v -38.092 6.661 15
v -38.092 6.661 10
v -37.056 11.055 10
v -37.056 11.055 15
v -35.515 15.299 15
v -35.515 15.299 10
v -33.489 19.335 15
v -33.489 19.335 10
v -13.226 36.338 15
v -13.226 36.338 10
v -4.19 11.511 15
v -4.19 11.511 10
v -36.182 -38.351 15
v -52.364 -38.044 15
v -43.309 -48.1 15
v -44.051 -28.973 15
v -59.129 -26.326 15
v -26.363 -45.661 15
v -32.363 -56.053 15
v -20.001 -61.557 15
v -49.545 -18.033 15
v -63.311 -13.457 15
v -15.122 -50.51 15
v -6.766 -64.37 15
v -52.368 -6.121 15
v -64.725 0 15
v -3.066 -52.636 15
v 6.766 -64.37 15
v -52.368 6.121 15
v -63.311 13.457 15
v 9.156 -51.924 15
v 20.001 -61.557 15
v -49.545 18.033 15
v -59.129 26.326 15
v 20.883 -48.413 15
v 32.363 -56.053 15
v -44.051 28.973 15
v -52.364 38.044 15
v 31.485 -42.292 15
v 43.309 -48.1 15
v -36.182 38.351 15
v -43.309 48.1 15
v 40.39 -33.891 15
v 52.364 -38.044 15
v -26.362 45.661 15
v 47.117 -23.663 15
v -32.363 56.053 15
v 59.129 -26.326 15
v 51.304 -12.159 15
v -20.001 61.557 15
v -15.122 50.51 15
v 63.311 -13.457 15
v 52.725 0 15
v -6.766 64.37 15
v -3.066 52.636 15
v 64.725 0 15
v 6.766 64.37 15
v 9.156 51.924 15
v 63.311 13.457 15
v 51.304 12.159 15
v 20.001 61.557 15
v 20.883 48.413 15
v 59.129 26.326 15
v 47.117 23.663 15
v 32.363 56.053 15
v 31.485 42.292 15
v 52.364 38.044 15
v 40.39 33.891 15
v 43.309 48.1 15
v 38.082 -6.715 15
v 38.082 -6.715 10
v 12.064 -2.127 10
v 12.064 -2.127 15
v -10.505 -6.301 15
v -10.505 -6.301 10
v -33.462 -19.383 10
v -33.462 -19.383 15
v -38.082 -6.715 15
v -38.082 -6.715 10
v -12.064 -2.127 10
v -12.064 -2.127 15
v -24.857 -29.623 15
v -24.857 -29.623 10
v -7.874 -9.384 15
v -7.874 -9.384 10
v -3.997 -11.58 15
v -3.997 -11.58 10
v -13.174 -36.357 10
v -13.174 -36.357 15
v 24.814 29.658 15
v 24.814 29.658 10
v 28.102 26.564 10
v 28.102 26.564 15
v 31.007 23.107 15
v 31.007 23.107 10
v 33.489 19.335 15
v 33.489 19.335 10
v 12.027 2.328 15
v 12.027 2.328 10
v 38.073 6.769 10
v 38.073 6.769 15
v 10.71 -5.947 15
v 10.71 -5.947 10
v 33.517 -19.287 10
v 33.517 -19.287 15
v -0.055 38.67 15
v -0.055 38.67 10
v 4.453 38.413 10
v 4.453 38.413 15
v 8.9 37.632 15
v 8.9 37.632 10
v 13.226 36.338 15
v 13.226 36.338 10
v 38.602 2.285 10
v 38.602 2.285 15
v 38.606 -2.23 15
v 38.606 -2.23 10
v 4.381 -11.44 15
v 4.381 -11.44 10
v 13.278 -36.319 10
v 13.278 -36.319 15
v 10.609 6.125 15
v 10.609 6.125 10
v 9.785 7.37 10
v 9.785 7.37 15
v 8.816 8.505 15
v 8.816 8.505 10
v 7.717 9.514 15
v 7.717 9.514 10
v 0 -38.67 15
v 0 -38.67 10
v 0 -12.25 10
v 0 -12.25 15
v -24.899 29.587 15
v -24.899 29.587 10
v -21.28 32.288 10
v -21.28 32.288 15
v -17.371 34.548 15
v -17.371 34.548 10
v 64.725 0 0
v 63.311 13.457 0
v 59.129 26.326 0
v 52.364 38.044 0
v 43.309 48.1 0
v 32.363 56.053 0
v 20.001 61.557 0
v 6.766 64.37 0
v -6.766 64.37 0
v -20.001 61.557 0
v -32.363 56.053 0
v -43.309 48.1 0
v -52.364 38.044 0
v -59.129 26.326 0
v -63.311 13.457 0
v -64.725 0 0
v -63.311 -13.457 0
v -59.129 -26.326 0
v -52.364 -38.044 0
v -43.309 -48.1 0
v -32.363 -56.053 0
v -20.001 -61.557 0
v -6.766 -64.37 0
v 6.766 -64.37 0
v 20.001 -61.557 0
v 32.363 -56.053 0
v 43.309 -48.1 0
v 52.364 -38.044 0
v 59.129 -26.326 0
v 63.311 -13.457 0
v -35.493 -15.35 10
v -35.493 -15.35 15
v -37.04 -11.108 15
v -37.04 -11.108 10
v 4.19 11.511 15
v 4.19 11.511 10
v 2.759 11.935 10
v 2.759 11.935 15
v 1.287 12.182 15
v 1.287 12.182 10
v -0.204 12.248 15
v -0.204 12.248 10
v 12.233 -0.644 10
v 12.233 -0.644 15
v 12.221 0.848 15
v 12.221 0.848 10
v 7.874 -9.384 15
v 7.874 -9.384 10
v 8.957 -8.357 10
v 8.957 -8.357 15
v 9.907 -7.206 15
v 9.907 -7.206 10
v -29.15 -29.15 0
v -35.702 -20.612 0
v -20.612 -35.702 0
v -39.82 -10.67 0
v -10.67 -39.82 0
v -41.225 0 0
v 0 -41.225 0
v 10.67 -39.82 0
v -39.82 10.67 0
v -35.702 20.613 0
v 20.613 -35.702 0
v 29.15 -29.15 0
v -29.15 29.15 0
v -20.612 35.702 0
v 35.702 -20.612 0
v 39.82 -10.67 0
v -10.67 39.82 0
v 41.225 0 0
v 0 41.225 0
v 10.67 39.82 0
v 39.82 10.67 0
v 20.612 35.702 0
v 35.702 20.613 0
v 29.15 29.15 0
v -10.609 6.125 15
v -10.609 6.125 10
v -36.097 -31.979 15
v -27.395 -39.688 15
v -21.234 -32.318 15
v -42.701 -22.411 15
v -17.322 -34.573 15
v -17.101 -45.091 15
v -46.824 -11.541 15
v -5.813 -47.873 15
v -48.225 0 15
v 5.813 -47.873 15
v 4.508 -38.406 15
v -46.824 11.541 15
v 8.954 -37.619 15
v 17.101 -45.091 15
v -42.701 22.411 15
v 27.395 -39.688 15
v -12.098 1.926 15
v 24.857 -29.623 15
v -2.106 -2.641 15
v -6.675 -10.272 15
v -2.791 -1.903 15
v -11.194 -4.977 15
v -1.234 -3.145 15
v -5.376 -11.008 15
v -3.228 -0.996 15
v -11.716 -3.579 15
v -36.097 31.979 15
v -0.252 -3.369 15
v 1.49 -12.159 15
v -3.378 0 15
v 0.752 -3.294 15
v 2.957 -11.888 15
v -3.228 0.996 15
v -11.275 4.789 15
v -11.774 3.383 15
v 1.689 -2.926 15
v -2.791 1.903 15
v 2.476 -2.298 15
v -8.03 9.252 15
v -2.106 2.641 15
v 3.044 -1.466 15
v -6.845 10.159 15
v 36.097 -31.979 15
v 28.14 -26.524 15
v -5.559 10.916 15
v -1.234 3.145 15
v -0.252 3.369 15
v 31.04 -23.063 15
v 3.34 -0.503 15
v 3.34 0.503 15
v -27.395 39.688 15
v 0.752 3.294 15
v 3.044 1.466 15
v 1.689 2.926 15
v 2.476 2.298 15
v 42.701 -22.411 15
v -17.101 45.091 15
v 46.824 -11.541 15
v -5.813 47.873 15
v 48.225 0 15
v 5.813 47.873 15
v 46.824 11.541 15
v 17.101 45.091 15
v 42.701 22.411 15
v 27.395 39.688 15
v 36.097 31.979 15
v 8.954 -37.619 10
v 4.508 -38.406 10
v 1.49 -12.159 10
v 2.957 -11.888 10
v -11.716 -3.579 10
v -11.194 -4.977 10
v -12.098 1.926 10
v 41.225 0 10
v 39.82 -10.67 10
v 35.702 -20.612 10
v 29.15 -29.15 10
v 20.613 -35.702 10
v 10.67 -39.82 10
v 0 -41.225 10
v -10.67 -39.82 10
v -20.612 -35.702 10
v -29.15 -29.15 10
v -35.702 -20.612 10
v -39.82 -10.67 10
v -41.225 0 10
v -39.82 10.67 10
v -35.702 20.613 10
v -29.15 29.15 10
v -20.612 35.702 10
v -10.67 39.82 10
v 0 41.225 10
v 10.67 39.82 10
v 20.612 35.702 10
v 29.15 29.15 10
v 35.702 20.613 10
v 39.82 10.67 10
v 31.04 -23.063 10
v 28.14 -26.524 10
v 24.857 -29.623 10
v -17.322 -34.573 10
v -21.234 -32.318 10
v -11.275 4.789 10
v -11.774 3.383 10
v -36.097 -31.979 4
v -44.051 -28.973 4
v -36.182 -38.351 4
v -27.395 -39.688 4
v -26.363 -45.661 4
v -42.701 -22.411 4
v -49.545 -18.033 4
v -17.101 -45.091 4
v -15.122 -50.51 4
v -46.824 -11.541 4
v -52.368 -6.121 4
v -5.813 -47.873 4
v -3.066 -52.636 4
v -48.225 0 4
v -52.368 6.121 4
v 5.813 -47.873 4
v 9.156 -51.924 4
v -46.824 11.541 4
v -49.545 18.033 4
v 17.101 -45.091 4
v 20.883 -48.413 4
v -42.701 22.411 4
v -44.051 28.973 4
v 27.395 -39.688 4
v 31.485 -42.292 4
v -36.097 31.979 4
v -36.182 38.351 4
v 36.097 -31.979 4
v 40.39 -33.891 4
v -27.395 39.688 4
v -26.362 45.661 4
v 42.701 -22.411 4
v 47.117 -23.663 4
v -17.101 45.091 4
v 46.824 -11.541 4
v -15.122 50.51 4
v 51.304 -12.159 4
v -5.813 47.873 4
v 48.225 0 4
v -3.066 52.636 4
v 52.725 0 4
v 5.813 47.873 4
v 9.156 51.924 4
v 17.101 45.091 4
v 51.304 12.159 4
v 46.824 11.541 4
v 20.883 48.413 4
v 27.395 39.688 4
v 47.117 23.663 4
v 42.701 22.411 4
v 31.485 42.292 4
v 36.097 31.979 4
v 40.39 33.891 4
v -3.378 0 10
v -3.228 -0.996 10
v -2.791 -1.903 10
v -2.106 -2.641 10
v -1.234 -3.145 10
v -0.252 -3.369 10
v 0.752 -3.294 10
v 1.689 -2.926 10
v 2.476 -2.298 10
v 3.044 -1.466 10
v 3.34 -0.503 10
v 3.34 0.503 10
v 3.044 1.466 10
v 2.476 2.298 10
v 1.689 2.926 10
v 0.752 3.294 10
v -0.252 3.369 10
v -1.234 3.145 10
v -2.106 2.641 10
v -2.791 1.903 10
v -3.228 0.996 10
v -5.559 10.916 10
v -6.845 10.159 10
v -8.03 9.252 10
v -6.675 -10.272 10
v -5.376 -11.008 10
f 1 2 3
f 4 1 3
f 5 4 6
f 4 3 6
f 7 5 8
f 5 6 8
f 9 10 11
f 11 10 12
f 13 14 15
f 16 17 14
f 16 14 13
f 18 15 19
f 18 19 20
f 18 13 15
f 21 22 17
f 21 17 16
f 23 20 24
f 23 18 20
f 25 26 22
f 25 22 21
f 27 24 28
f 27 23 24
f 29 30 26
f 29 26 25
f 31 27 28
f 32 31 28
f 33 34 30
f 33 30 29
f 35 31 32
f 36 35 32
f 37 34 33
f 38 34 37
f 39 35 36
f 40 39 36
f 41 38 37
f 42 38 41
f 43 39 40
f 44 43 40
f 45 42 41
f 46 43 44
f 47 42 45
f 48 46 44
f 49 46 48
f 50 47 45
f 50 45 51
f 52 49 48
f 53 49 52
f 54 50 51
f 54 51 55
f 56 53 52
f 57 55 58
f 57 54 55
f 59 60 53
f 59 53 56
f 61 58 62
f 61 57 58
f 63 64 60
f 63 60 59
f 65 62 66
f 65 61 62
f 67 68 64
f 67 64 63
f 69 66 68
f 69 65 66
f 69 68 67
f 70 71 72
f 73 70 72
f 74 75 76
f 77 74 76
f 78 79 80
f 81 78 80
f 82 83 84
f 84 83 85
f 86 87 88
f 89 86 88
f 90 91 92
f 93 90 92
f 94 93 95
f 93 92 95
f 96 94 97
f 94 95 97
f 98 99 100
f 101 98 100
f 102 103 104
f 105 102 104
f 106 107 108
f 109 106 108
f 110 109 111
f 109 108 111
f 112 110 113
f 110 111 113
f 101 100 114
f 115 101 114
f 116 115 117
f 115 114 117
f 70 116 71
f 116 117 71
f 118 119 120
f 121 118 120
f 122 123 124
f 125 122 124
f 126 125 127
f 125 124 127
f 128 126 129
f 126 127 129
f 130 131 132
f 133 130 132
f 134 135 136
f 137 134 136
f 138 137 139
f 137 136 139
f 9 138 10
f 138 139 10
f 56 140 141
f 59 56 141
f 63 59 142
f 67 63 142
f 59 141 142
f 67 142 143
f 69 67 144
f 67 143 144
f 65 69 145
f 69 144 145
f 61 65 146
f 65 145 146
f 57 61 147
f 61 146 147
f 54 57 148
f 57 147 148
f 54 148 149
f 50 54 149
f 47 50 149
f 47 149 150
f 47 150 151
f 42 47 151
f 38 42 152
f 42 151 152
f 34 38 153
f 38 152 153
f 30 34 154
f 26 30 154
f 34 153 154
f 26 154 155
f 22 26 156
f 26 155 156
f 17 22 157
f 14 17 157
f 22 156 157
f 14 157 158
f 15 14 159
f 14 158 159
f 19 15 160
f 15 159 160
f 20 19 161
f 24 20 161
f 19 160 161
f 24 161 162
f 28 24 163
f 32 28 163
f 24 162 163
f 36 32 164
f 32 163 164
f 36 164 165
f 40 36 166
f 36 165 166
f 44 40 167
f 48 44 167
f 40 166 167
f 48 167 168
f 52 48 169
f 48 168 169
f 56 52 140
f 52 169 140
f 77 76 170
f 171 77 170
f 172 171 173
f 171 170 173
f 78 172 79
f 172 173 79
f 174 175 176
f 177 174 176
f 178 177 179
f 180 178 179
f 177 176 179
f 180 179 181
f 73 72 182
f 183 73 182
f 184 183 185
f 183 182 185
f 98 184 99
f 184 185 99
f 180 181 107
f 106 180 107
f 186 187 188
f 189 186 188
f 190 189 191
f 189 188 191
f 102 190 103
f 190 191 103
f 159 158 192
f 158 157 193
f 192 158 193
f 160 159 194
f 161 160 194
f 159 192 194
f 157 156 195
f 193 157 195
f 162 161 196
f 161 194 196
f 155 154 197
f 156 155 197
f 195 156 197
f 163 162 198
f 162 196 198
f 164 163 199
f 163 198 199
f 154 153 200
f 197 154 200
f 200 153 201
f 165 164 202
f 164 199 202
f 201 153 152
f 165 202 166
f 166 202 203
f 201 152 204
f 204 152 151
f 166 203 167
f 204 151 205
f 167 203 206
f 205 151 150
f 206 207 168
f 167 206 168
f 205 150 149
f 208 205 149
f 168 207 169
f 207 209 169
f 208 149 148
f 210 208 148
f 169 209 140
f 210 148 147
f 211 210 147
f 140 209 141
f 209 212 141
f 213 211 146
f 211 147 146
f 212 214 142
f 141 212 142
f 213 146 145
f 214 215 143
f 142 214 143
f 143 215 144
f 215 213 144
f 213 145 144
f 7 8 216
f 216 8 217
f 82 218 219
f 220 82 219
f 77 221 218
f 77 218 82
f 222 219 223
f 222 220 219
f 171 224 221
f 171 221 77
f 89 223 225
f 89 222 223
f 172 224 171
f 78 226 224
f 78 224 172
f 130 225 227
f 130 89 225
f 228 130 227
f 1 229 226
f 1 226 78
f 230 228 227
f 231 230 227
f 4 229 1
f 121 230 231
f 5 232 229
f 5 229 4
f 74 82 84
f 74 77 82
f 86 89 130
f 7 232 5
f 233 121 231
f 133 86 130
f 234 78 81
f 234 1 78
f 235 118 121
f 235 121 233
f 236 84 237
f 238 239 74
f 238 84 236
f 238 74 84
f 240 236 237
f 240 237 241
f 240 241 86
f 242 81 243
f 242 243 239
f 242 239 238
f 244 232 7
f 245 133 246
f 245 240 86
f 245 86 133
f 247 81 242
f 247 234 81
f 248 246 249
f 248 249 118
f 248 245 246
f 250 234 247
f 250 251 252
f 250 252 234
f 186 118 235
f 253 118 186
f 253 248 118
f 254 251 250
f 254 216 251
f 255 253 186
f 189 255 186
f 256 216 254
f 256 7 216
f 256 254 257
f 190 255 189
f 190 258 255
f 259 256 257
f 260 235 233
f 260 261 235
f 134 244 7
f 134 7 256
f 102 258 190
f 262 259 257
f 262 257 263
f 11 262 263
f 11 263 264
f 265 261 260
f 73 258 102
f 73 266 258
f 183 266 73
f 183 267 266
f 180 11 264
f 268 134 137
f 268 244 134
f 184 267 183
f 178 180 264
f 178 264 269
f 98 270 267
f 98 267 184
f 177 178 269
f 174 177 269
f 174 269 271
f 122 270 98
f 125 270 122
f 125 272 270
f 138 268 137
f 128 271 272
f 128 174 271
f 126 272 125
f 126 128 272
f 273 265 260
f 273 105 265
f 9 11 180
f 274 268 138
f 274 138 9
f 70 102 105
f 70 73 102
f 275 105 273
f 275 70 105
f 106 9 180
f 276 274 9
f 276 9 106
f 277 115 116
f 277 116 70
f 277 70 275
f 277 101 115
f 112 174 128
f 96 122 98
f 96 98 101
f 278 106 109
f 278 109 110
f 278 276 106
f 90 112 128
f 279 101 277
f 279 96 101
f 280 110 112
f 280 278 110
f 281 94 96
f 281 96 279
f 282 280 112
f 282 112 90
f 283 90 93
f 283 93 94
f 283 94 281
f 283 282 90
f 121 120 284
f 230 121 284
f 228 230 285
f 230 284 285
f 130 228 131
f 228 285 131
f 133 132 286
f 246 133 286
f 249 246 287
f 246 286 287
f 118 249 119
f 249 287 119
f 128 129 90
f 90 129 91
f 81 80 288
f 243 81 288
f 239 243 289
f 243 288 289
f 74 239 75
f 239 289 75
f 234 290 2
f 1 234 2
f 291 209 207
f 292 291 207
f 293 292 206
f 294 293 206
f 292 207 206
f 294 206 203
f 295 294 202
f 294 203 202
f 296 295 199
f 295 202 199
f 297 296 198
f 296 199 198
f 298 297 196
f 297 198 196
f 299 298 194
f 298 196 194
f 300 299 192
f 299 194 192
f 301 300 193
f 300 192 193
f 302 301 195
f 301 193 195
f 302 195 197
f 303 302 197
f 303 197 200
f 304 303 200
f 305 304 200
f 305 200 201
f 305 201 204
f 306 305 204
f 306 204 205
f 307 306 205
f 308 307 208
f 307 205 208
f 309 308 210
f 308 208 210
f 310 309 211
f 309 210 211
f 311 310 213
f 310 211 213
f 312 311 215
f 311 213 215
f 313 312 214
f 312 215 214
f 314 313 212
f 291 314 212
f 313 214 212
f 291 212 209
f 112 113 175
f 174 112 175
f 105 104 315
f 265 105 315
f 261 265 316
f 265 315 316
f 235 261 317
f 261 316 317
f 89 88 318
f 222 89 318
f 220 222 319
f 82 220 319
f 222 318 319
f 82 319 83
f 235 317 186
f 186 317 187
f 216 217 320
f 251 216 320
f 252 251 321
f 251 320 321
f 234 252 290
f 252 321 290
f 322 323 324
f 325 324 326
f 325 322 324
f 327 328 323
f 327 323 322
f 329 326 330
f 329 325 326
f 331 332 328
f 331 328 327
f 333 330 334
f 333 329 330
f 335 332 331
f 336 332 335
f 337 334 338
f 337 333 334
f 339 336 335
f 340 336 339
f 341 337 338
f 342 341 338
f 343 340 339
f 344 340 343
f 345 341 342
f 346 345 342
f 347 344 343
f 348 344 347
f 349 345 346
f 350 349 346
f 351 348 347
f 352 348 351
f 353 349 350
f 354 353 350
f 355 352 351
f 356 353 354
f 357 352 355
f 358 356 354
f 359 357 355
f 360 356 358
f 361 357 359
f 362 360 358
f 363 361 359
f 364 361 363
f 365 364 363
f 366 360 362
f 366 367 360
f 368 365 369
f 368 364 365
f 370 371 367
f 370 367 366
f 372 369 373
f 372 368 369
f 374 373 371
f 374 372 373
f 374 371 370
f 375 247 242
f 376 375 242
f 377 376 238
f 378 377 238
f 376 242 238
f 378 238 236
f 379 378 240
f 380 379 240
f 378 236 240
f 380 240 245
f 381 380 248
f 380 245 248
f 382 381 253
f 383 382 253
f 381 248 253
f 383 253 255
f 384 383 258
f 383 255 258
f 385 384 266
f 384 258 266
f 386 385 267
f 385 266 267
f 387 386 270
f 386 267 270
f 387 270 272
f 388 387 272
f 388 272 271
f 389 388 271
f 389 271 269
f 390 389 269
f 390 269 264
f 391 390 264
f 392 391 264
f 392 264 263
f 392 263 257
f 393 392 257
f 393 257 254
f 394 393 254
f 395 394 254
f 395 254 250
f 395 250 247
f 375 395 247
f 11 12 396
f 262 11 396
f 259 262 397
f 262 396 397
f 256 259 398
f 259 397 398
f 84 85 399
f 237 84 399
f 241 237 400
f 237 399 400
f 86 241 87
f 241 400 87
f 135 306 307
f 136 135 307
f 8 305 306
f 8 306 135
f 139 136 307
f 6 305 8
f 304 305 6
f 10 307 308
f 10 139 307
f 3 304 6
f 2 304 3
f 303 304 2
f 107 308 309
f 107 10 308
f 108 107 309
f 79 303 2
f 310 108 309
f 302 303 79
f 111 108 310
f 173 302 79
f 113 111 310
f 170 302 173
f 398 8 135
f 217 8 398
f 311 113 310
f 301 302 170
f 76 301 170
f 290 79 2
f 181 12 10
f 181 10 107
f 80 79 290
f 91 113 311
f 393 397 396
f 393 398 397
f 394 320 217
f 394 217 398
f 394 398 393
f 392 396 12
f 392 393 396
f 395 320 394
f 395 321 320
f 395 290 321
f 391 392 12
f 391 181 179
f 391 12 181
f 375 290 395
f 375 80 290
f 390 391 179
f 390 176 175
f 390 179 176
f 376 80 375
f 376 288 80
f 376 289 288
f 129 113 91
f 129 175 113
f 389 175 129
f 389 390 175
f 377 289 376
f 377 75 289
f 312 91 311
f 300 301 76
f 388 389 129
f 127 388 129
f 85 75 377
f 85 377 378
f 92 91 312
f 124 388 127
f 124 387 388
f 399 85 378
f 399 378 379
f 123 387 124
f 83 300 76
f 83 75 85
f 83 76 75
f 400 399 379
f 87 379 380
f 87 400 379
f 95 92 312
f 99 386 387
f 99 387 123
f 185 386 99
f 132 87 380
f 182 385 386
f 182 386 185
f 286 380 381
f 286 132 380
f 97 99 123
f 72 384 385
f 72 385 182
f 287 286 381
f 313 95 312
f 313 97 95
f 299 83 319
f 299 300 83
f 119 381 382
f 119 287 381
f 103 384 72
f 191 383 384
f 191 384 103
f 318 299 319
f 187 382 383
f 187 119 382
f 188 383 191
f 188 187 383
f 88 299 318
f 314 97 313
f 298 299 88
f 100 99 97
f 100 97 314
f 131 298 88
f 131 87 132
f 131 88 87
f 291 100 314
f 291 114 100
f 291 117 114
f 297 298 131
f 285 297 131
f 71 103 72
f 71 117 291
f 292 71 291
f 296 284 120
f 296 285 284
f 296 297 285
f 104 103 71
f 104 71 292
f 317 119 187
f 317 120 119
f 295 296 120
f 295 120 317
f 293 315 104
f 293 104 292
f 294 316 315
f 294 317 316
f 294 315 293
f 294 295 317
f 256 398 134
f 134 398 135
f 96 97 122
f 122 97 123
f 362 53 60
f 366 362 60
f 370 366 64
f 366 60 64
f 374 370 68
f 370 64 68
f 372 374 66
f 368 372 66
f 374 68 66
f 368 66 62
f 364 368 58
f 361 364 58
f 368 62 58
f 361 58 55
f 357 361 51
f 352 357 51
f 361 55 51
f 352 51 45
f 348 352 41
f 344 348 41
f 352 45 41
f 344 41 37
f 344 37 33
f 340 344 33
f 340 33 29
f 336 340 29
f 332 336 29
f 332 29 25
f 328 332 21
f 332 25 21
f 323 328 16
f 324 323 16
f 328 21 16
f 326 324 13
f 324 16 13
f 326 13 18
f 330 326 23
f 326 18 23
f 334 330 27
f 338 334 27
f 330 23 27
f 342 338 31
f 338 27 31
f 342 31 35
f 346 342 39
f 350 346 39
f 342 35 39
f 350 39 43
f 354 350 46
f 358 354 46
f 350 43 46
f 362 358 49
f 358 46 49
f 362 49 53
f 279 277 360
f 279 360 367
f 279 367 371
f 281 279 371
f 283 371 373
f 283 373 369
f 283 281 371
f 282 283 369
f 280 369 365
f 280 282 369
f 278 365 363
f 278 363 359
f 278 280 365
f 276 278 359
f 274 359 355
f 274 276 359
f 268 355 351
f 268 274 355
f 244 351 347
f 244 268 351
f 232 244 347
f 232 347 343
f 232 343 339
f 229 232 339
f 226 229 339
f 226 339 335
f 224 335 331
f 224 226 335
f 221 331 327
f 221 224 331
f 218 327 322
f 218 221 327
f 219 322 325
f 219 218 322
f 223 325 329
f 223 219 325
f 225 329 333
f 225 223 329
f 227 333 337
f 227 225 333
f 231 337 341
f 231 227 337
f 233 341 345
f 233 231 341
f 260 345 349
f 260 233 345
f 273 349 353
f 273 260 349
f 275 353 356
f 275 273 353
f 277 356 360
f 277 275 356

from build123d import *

# Parameters (mm, degrees)
F0_R     = 64.725
F1_DEPTH = 15
F2_R     = 52.725
F2_R_2   = 48.225
F3_DEPTH = 11
F4_R     = 41.225
F5_DEPTH = 10
F7_DEPTH = 5
F8_D     = 6.7564


with BuildPart() as f1:
    # F0 (on Top) → F1 (new body)
    with BuildSketch(Plane.XY):
        Circle(F0_R)
    extrude(amount=F1_DEPTH)

    # F2 (on face) → F3 (cut)
    with BuildSketch(Plane.XY.offset(15)):
        Circle(F2_R)
        Circle(F2_R_2, mode=Mode.SUBTRACT)
    extrude(amount=-F3_DEPTH, mode=Mode.SUBTRACT)

    # F4 (on face) → F5 (cut)
    with BuildSketch(Plane(origin=(0, 0, 0), x_dir=(1, 0, 0), z_dir=(0, 0, -1))):
        Circle(F4_R)
    extrude(amount=-F5_DEPTH, mode=Mode.SUBTRACT)

    # F6 (on face) → F7 (cut, through all)
    with BuildSketch(Plane(origin=(0, 0, 10), x_dir=(1, 0, 0), z_dir=(0, 0, -1))):
        with BuildLine():
            ThreePointArc((0, 12.2501222179), (2.2276802059, 12.0458679743), (4.3810732942, 11.4399165707))
            Line((4.3810732942, 11.4399165707), (13.2776884508, 36.3189443658))
            ThreePointArc((13.2776884508, 36.3189443658), (6.7421083146, 38.0776404983), (0, 38.6699202281))
            Line((0, 38.6699202281), (0, 12.2501222179))
        make_face()
        with BuildLine():
            Line((10.7095334794, 5.9473848881), (33.5166668905, 19.28719189))
            ThreePointArc((33.5166668905, 19.28719189), (29.6405901277, 24.8354212231), (24.8565455902, 29.6228775066))
            Line((24.8565455902, 29.6228775066), (7.8742267788, 9.3841380525))
            ThreePointArc((7.8742267788, 9.3841380525), (9.4494367246, 7.7957449895), (10.7095334794, 5.9473848881))
        make_face()
        with BuildLine():
            Line((12.0268839264, -2.3279942814), (38.0728243958, -6.7692520245))
            ThreePointArc((38.0728243958, -6.7692520245), (38.6699104016, -0.0275676574), (38.082437249, 6.7149611781))
            Line((38.082437249, 6.7149611781), (12.0640153355, 2.1272113993))
            ThreePointArc((12.0640153355, 2.1272113993), (12.249696781, -0.1020937159), (12.0268839264, -2.3279942814))
        make_face()
        with BuildLine():
            Line((7.7167217203, -9.5140790539), (24.8142842341, -29.6582876849))
            ThreePointArc((24.8142842341, -29.6582876849), (29.6051498304, -24.8776573246), (33.4891332798, -19.334960114))
            Line((33.4891332798, -19.334960114), (10.6089170402, -6.1250611089))
            ThreePointArc((10.6089170402, -6.1250611089), (9.3181875734, -7.952161637), (7.7167217203, -9.5140790539))
        make_face()
        with BuildLine():
            Line((-0.2041803405, -12.2484204999), (-0.0551353009, -38.6698809223))
            ThreePointArc((-0.0551353009, -38.6698809223), (6.687810629, -38.0872146453), (13.2258916588, -36.3378386847))
            Line((13.2258916588, -36.3378386847), (4.1897885567, -11.5113494519))
            ThreePointArc((4.1897885567, -11.5113494519), (2.0265948401, -12.0813247497), (-0.2041803405, -12.2484204999))
        make_face()
        with BuildLine():
            Line((-8.0295441508, -9.2515898679), (-24.8987564158, -29.5874071083))
            ThreePointArc((-24.8987564158, -29.5874071083), (-19.3588294925, -33.4753409412), (-13.2258916588, -36.3378386847))
            Line((-13.2258916588, -36.3378386847), (-4.1897885567, -11.5113494519))
            ThreePointArc((-4.1897885567, -11.5113494519), (-6.213264142, -10.5575017431), (-8.0295441508, -9.2515898679))
        make_face()
        with BuildLine():
            Line((-12.0977950145, -1.9258375168), (-38.0919726849, -6.660656681))
            ThreePointArc((-38.0919726849, -6.660656681), (-36.347258145, -13.1999831737), (-33.4891332798, -19.334960114))
            Line((-33.4891332798, -19.334960114), (-10.6089170402, -6.1250611089))
            ThreePointArc((-10.6089170402, -6.1250611089), (-11.5458677793, -4.0937063373), (-12.0977950145, -1.9258375168))
        make_face()
        with BuildLine():
            Line((-10.5053531389, 6.3010356118), (-33.4615315896, 19.3826890323))
            ThreePointArc((-33.4615315896, 19.3826890323), (-36.3284007567, 13.2517934222), (-38.082437249, 6.7149611781))
            Line((-38.082437249, 6.7149611781), (-12.0640153355, 2.1272113993))
            ThreePointArc((-12.0640153355, 2.1272113993), (-11.4760315646, 4.2855797602), (-10.5053531389, 6.3010356118))
        make_face()
        with BuildLine():
            Line((-3.9973397756, 11.5795841493), (-13.1740679801, 36.3566591329))
            ThreePointArc((-13.1740679801, 36.3566591329), (-19.3110809092, 33.5029085986), (-24.8565455902, 29.6228775066))
            Line((-24.8565455902, 29.6228775066), (-7.8742267788, 9.3841380525))
            ThreePointArc((-7.8742267788, 9.3841380525), (-6.036432639, 10.6595954589), (-3.9973397756, 11.5795841493))
        make_face()
    extrude(amount=-F7_DEPTH, mode=Mode.SUBTRACT)

    # F8 (through all)
    with Locations(Plane(origin=(0, 0, 10), x_dir=(1, 0, 0), z_dir=(0, 0, -1))):
        with Locations((0, 0)):
            Hole(F8_D / 2)


solid = f1.part
